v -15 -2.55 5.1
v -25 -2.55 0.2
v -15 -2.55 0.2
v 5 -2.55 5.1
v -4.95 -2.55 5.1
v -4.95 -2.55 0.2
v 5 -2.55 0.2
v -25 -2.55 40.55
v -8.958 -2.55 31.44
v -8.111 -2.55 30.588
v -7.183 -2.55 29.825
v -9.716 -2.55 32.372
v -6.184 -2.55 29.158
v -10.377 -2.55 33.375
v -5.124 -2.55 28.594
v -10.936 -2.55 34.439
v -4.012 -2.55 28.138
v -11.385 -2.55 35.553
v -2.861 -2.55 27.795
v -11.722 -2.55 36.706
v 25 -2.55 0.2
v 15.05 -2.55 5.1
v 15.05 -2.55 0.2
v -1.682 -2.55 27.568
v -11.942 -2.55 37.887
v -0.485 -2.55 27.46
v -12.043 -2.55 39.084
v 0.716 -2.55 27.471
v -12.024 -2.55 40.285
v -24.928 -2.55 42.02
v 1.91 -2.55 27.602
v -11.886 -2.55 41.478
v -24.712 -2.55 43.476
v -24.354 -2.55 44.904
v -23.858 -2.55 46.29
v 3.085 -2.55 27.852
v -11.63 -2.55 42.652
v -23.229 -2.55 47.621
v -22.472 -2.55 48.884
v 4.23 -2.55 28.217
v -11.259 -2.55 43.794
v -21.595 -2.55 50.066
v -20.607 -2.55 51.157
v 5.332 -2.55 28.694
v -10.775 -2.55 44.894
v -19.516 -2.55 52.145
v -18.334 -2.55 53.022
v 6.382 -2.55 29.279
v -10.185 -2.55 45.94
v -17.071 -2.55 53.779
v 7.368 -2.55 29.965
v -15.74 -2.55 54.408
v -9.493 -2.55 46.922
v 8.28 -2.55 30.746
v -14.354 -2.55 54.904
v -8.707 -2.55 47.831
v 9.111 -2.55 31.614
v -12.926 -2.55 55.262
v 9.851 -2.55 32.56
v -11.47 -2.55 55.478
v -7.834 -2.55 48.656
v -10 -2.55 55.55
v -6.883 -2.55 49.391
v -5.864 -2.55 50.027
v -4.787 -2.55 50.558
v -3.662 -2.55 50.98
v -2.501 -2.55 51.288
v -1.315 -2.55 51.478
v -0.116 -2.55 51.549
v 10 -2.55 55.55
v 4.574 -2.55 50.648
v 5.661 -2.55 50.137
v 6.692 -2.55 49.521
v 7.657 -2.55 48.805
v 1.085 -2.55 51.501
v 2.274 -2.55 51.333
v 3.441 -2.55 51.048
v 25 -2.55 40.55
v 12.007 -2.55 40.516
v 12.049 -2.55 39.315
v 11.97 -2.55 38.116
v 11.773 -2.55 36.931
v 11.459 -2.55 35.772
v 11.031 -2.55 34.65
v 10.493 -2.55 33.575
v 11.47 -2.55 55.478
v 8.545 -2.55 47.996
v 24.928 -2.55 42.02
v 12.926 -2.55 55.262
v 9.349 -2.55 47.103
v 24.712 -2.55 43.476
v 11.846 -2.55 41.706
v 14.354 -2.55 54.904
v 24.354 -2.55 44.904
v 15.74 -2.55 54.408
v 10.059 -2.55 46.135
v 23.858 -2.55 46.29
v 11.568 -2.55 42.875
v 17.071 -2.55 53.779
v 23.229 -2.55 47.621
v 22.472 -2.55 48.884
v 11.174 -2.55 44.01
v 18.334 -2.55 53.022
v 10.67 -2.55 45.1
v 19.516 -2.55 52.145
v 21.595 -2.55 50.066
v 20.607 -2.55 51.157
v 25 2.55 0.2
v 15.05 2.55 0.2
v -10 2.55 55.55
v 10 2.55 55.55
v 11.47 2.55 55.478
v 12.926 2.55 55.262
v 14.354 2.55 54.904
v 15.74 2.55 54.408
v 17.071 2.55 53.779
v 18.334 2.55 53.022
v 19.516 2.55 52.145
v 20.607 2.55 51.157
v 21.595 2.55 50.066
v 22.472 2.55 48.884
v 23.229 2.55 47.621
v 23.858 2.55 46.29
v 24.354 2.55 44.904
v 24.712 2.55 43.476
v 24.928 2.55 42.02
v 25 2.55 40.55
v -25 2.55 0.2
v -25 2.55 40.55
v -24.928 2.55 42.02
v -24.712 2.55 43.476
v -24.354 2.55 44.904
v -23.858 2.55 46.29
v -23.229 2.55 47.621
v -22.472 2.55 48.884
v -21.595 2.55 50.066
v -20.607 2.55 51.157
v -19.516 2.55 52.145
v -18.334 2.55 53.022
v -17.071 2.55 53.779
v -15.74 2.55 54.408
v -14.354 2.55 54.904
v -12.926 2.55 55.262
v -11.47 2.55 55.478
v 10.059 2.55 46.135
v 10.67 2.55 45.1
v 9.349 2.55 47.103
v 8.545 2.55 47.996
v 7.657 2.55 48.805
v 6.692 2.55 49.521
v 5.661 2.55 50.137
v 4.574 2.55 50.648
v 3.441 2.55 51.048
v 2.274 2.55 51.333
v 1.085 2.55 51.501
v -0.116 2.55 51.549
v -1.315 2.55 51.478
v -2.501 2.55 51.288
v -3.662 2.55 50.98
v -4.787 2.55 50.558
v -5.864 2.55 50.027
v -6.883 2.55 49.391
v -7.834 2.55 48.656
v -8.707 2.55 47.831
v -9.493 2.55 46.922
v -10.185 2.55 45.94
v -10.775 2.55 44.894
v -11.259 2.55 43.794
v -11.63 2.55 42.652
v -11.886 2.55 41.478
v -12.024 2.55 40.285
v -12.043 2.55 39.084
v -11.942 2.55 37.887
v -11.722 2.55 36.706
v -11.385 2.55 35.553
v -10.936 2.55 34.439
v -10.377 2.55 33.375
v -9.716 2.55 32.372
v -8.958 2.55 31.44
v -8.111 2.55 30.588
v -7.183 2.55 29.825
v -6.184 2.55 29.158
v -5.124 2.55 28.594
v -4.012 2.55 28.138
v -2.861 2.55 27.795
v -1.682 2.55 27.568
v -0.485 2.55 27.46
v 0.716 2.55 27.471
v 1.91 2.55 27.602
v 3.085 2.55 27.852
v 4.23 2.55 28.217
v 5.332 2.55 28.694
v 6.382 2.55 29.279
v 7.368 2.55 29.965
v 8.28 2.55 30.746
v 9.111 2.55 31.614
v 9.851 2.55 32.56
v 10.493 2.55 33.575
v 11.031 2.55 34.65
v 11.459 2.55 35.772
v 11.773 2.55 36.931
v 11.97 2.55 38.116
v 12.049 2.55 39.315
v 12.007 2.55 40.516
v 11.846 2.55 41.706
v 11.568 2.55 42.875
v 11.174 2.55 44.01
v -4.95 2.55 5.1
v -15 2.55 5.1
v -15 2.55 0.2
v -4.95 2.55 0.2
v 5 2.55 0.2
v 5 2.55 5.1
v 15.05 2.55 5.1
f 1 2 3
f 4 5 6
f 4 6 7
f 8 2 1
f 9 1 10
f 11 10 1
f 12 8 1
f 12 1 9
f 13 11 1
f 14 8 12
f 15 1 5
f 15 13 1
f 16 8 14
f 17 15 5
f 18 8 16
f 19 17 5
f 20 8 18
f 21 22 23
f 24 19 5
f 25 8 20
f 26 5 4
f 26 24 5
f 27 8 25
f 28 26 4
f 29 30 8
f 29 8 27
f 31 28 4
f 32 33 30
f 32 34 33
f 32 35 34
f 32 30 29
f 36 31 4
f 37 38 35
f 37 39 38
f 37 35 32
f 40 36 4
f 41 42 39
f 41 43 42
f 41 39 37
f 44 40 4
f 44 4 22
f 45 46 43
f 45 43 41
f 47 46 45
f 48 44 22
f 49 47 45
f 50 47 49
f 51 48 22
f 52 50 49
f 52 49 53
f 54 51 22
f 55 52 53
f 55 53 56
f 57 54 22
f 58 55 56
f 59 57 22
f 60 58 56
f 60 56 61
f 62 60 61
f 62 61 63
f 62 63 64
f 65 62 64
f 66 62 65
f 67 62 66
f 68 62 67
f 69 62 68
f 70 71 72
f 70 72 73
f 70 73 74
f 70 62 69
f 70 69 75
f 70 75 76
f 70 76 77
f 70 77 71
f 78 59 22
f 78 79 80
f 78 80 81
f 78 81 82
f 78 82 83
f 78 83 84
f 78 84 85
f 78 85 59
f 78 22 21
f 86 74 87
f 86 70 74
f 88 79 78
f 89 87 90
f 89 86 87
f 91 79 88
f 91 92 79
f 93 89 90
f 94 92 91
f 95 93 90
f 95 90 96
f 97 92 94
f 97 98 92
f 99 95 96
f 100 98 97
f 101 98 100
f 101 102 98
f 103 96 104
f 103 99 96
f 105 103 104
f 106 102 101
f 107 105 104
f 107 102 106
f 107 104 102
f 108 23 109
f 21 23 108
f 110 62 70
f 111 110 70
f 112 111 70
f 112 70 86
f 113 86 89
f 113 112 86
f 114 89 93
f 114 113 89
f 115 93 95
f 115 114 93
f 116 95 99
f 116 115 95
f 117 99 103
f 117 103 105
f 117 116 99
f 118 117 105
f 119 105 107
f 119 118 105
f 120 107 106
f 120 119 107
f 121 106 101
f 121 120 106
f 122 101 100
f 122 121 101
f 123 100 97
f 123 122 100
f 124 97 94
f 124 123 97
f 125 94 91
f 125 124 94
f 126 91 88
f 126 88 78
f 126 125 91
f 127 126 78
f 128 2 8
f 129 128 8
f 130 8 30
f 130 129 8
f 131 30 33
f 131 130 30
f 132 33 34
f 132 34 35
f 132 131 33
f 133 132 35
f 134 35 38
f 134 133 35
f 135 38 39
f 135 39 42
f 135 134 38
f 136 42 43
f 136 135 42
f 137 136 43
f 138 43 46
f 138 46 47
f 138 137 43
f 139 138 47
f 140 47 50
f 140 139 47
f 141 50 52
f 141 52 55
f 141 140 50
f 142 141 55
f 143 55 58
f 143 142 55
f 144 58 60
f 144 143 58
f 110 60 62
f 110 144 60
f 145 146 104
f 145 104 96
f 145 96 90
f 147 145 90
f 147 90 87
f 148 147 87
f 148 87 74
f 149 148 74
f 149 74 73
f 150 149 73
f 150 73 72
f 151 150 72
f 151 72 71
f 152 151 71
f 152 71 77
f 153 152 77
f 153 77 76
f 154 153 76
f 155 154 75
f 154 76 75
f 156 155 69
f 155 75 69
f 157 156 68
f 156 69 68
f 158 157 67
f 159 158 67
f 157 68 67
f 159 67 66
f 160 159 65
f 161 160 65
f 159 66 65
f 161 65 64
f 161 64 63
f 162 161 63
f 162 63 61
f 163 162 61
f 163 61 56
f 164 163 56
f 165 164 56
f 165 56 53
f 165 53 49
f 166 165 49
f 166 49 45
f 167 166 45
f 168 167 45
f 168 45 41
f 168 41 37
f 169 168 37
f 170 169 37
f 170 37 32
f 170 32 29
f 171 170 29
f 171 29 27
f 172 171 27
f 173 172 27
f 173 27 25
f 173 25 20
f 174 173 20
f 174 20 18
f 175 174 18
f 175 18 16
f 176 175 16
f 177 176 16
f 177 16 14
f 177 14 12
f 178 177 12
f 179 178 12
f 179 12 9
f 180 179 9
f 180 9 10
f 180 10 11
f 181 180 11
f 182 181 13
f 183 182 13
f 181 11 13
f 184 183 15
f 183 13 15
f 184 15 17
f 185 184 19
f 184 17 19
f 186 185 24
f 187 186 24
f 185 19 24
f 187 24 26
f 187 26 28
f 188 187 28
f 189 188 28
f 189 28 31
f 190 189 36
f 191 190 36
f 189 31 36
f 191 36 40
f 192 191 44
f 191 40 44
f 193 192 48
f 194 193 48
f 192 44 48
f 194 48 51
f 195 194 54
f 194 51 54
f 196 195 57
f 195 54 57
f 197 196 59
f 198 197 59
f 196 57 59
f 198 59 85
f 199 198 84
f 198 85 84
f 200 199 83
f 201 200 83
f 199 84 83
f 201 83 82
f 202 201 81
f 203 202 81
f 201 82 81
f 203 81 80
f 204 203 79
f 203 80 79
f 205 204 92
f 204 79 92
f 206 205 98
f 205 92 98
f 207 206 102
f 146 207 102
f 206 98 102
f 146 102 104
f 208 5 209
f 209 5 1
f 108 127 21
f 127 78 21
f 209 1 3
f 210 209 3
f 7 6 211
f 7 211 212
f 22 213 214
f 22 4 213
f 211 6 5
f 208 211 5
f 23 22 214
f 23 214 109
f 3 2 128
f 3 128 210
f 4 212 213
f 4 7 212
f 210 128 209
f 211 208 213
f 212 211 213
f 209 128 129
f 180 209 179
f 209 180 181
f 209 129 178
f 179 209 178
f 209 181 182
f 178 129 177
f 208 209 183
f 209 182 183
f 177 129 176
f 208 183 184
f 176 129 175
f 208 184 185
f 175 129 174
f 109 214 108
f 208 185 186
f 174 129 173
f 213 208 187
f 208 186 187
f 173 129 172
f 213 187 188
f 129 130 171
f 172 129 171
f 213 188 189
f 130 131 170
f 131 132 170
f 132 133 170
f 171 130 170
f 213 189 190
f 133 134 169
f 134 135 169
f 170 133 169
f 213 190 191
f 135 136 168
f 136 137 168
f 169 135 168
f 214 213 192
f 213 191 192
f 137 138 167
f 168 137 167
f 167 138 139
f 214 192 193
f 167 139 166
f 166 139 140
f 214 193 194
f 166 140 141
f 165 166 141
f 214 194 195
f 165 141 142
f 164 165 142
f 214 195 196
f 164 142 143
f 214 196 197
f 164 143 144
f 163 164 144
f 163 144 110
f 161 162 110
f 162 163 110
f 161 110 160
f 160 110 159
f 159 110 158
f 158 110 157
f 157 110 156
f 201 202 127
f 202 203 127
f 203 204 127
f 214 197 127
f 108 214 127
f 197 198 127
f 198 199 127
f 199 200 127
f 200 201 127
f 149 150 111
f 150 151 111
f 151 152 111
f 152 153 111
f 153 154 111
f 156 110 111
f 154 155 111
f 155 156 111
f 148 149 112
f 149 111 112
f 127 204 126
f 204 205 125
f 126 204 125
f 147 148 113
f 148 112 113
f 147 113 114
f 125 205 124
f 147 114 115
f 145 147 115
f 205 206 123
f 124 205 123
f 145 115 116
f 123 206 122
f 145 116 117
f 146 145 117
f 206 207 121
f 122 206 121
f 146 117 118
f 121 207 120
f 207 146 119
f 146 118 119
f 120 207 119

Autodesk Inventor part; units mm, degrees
ref_plane "YZ Plane" through (0, 0, 0) normal (1, 0, 0) x (0, 1, 0)
ref_plane "XZ Plane" through (0, 0, 0) normal (0, 1, 0) x (-1, 0, 0)
ref_plane "XY Plane" through (0, 0, 0) normal (0, 0, 1) x (1, 0, 0)
sketch "Sketch1" plane through (0, 0, 0) normal (0, 0, 1) x (1, 0, 0)
  line L0 (25, -2.55) -> (-25, -2.55)
  line L1 (-25, -2.55) -> (-25, 2.55)
  line L2 (-25, 2.55) -> (25, 2.55)
  line L3 (25, 2.55) -> (25, -2.55)
  line L4 (25, -2.55) -> (-25, 2.55) construction
  line L5 (-25, -2.55) -> (25, 2.55) construction
  point P0 (0, 0)
  dimension "d0" = 50
  dimension "d1" = 5.1
extrude "Extrusion1" add sketch "Sketch1" along normal blind 45.1
sketch "Sketch2" plane through (-25, -2.55, 0) normal (0, -1, 0) x (1, 0, 0)
  line L0 (50, 0) -> (0, 0) projected
  line L1 (10, 0) -> (20.05, 0)
  line L2 (20.05, 0) -> (20.05, 5.1)
  line L3 (20.05, 5.1) -> (10, 5.1)
  line L4 (10, 5.1) -> (10, 0)
  line L5 (40.05, 0) -> (30, 0)
  line L6 (30, 0) -> (30, 5.1)
  line L7 (30, 5.1) -> (40.05, 5.1)
  line L8 (40.05, 5.1) -> (40.05, 0)
  line L9 (50, 0) -> (50, 45.1) projected
  line L10 (0, 0) -> (0, 45.1) projected
  point P0 (25, 0)
  point P1 (40.05, 2.55)
  point P2 (10, 2.55)
  dimension "d5" = 5.1
  dimension "d9" = 5.1
  dimension "d17" = 9.95
  dimension "d24" = 9.95
  dimension "d25" = 10.05
  dimension "d26" = 10.05
extrude "Extrusion2" cut sketch "Sketch2" against normal blind 45.1
sketch "Sketch3" plane through (-25, -2.55, 45.1) normal (0, -1, 0) x (1, 0, 0)
  circle A0 centre (25, -5.6) radius 3.45
  line L0 (0, 0) -> (50, 0) projected
  circle A1 centre (25, -5.6) radius 12.05
  line L1 (50, 0) -> (0, 0)
  line L2 (0, 0) -> (0, 10.45)
  line L3 (0, 10.45) -> (50, 10.45)
  line L4 (50, 10.45) -> (50, 0)
  line L5 (0, -45.1) -> (0, 0) projected
  line L6 (50, -45.1) -> (50, 0) projected
  line L7 (0, -44.9) -> (50, -44.9)
  line L8 (50, -44.9) -> (50, -45.1)
  line L9 (50, -45.1) -> (0, -45.1)
  line L10 (0, -45.1) -> (0, -44.9)
  point P0 (25, -45.1)
  point P1 (14.3303, 0)
  point P2 (35.6697, 0)
  dimension "d12" = 6.9
  dimension "d13" = 5.6
  dimension "d14" = 25
  dimension "d19" = 24.1
  dimension "d20" = 16.05
  dimension "d27" = 0.2
extrude "Extrusion3" cut sketch "Sketch3" against normal blind 45.1 contours A0 | L0 A1 picked at (25.1386, -0.7251)
extrude "Extrusion4" add sketch "Sketch3" against normal up to surface (5.1 mm away) contours L2 L3 L4 L0 A1
extrude "Extrusion5" cut sketch "Sketch3" against normal through all contours L7 L6 L9 L5
fillet "Fillet1" radius 15 2 edges at (25, 0, 55.55) (-25, 0, 55.55)
equation "\"d24\" = d23"
equation "\"d26\" = d25"
equation "\"d23\" = d17"
properties part number "motorholder1A" material "Polycarbonate, Smoke"
